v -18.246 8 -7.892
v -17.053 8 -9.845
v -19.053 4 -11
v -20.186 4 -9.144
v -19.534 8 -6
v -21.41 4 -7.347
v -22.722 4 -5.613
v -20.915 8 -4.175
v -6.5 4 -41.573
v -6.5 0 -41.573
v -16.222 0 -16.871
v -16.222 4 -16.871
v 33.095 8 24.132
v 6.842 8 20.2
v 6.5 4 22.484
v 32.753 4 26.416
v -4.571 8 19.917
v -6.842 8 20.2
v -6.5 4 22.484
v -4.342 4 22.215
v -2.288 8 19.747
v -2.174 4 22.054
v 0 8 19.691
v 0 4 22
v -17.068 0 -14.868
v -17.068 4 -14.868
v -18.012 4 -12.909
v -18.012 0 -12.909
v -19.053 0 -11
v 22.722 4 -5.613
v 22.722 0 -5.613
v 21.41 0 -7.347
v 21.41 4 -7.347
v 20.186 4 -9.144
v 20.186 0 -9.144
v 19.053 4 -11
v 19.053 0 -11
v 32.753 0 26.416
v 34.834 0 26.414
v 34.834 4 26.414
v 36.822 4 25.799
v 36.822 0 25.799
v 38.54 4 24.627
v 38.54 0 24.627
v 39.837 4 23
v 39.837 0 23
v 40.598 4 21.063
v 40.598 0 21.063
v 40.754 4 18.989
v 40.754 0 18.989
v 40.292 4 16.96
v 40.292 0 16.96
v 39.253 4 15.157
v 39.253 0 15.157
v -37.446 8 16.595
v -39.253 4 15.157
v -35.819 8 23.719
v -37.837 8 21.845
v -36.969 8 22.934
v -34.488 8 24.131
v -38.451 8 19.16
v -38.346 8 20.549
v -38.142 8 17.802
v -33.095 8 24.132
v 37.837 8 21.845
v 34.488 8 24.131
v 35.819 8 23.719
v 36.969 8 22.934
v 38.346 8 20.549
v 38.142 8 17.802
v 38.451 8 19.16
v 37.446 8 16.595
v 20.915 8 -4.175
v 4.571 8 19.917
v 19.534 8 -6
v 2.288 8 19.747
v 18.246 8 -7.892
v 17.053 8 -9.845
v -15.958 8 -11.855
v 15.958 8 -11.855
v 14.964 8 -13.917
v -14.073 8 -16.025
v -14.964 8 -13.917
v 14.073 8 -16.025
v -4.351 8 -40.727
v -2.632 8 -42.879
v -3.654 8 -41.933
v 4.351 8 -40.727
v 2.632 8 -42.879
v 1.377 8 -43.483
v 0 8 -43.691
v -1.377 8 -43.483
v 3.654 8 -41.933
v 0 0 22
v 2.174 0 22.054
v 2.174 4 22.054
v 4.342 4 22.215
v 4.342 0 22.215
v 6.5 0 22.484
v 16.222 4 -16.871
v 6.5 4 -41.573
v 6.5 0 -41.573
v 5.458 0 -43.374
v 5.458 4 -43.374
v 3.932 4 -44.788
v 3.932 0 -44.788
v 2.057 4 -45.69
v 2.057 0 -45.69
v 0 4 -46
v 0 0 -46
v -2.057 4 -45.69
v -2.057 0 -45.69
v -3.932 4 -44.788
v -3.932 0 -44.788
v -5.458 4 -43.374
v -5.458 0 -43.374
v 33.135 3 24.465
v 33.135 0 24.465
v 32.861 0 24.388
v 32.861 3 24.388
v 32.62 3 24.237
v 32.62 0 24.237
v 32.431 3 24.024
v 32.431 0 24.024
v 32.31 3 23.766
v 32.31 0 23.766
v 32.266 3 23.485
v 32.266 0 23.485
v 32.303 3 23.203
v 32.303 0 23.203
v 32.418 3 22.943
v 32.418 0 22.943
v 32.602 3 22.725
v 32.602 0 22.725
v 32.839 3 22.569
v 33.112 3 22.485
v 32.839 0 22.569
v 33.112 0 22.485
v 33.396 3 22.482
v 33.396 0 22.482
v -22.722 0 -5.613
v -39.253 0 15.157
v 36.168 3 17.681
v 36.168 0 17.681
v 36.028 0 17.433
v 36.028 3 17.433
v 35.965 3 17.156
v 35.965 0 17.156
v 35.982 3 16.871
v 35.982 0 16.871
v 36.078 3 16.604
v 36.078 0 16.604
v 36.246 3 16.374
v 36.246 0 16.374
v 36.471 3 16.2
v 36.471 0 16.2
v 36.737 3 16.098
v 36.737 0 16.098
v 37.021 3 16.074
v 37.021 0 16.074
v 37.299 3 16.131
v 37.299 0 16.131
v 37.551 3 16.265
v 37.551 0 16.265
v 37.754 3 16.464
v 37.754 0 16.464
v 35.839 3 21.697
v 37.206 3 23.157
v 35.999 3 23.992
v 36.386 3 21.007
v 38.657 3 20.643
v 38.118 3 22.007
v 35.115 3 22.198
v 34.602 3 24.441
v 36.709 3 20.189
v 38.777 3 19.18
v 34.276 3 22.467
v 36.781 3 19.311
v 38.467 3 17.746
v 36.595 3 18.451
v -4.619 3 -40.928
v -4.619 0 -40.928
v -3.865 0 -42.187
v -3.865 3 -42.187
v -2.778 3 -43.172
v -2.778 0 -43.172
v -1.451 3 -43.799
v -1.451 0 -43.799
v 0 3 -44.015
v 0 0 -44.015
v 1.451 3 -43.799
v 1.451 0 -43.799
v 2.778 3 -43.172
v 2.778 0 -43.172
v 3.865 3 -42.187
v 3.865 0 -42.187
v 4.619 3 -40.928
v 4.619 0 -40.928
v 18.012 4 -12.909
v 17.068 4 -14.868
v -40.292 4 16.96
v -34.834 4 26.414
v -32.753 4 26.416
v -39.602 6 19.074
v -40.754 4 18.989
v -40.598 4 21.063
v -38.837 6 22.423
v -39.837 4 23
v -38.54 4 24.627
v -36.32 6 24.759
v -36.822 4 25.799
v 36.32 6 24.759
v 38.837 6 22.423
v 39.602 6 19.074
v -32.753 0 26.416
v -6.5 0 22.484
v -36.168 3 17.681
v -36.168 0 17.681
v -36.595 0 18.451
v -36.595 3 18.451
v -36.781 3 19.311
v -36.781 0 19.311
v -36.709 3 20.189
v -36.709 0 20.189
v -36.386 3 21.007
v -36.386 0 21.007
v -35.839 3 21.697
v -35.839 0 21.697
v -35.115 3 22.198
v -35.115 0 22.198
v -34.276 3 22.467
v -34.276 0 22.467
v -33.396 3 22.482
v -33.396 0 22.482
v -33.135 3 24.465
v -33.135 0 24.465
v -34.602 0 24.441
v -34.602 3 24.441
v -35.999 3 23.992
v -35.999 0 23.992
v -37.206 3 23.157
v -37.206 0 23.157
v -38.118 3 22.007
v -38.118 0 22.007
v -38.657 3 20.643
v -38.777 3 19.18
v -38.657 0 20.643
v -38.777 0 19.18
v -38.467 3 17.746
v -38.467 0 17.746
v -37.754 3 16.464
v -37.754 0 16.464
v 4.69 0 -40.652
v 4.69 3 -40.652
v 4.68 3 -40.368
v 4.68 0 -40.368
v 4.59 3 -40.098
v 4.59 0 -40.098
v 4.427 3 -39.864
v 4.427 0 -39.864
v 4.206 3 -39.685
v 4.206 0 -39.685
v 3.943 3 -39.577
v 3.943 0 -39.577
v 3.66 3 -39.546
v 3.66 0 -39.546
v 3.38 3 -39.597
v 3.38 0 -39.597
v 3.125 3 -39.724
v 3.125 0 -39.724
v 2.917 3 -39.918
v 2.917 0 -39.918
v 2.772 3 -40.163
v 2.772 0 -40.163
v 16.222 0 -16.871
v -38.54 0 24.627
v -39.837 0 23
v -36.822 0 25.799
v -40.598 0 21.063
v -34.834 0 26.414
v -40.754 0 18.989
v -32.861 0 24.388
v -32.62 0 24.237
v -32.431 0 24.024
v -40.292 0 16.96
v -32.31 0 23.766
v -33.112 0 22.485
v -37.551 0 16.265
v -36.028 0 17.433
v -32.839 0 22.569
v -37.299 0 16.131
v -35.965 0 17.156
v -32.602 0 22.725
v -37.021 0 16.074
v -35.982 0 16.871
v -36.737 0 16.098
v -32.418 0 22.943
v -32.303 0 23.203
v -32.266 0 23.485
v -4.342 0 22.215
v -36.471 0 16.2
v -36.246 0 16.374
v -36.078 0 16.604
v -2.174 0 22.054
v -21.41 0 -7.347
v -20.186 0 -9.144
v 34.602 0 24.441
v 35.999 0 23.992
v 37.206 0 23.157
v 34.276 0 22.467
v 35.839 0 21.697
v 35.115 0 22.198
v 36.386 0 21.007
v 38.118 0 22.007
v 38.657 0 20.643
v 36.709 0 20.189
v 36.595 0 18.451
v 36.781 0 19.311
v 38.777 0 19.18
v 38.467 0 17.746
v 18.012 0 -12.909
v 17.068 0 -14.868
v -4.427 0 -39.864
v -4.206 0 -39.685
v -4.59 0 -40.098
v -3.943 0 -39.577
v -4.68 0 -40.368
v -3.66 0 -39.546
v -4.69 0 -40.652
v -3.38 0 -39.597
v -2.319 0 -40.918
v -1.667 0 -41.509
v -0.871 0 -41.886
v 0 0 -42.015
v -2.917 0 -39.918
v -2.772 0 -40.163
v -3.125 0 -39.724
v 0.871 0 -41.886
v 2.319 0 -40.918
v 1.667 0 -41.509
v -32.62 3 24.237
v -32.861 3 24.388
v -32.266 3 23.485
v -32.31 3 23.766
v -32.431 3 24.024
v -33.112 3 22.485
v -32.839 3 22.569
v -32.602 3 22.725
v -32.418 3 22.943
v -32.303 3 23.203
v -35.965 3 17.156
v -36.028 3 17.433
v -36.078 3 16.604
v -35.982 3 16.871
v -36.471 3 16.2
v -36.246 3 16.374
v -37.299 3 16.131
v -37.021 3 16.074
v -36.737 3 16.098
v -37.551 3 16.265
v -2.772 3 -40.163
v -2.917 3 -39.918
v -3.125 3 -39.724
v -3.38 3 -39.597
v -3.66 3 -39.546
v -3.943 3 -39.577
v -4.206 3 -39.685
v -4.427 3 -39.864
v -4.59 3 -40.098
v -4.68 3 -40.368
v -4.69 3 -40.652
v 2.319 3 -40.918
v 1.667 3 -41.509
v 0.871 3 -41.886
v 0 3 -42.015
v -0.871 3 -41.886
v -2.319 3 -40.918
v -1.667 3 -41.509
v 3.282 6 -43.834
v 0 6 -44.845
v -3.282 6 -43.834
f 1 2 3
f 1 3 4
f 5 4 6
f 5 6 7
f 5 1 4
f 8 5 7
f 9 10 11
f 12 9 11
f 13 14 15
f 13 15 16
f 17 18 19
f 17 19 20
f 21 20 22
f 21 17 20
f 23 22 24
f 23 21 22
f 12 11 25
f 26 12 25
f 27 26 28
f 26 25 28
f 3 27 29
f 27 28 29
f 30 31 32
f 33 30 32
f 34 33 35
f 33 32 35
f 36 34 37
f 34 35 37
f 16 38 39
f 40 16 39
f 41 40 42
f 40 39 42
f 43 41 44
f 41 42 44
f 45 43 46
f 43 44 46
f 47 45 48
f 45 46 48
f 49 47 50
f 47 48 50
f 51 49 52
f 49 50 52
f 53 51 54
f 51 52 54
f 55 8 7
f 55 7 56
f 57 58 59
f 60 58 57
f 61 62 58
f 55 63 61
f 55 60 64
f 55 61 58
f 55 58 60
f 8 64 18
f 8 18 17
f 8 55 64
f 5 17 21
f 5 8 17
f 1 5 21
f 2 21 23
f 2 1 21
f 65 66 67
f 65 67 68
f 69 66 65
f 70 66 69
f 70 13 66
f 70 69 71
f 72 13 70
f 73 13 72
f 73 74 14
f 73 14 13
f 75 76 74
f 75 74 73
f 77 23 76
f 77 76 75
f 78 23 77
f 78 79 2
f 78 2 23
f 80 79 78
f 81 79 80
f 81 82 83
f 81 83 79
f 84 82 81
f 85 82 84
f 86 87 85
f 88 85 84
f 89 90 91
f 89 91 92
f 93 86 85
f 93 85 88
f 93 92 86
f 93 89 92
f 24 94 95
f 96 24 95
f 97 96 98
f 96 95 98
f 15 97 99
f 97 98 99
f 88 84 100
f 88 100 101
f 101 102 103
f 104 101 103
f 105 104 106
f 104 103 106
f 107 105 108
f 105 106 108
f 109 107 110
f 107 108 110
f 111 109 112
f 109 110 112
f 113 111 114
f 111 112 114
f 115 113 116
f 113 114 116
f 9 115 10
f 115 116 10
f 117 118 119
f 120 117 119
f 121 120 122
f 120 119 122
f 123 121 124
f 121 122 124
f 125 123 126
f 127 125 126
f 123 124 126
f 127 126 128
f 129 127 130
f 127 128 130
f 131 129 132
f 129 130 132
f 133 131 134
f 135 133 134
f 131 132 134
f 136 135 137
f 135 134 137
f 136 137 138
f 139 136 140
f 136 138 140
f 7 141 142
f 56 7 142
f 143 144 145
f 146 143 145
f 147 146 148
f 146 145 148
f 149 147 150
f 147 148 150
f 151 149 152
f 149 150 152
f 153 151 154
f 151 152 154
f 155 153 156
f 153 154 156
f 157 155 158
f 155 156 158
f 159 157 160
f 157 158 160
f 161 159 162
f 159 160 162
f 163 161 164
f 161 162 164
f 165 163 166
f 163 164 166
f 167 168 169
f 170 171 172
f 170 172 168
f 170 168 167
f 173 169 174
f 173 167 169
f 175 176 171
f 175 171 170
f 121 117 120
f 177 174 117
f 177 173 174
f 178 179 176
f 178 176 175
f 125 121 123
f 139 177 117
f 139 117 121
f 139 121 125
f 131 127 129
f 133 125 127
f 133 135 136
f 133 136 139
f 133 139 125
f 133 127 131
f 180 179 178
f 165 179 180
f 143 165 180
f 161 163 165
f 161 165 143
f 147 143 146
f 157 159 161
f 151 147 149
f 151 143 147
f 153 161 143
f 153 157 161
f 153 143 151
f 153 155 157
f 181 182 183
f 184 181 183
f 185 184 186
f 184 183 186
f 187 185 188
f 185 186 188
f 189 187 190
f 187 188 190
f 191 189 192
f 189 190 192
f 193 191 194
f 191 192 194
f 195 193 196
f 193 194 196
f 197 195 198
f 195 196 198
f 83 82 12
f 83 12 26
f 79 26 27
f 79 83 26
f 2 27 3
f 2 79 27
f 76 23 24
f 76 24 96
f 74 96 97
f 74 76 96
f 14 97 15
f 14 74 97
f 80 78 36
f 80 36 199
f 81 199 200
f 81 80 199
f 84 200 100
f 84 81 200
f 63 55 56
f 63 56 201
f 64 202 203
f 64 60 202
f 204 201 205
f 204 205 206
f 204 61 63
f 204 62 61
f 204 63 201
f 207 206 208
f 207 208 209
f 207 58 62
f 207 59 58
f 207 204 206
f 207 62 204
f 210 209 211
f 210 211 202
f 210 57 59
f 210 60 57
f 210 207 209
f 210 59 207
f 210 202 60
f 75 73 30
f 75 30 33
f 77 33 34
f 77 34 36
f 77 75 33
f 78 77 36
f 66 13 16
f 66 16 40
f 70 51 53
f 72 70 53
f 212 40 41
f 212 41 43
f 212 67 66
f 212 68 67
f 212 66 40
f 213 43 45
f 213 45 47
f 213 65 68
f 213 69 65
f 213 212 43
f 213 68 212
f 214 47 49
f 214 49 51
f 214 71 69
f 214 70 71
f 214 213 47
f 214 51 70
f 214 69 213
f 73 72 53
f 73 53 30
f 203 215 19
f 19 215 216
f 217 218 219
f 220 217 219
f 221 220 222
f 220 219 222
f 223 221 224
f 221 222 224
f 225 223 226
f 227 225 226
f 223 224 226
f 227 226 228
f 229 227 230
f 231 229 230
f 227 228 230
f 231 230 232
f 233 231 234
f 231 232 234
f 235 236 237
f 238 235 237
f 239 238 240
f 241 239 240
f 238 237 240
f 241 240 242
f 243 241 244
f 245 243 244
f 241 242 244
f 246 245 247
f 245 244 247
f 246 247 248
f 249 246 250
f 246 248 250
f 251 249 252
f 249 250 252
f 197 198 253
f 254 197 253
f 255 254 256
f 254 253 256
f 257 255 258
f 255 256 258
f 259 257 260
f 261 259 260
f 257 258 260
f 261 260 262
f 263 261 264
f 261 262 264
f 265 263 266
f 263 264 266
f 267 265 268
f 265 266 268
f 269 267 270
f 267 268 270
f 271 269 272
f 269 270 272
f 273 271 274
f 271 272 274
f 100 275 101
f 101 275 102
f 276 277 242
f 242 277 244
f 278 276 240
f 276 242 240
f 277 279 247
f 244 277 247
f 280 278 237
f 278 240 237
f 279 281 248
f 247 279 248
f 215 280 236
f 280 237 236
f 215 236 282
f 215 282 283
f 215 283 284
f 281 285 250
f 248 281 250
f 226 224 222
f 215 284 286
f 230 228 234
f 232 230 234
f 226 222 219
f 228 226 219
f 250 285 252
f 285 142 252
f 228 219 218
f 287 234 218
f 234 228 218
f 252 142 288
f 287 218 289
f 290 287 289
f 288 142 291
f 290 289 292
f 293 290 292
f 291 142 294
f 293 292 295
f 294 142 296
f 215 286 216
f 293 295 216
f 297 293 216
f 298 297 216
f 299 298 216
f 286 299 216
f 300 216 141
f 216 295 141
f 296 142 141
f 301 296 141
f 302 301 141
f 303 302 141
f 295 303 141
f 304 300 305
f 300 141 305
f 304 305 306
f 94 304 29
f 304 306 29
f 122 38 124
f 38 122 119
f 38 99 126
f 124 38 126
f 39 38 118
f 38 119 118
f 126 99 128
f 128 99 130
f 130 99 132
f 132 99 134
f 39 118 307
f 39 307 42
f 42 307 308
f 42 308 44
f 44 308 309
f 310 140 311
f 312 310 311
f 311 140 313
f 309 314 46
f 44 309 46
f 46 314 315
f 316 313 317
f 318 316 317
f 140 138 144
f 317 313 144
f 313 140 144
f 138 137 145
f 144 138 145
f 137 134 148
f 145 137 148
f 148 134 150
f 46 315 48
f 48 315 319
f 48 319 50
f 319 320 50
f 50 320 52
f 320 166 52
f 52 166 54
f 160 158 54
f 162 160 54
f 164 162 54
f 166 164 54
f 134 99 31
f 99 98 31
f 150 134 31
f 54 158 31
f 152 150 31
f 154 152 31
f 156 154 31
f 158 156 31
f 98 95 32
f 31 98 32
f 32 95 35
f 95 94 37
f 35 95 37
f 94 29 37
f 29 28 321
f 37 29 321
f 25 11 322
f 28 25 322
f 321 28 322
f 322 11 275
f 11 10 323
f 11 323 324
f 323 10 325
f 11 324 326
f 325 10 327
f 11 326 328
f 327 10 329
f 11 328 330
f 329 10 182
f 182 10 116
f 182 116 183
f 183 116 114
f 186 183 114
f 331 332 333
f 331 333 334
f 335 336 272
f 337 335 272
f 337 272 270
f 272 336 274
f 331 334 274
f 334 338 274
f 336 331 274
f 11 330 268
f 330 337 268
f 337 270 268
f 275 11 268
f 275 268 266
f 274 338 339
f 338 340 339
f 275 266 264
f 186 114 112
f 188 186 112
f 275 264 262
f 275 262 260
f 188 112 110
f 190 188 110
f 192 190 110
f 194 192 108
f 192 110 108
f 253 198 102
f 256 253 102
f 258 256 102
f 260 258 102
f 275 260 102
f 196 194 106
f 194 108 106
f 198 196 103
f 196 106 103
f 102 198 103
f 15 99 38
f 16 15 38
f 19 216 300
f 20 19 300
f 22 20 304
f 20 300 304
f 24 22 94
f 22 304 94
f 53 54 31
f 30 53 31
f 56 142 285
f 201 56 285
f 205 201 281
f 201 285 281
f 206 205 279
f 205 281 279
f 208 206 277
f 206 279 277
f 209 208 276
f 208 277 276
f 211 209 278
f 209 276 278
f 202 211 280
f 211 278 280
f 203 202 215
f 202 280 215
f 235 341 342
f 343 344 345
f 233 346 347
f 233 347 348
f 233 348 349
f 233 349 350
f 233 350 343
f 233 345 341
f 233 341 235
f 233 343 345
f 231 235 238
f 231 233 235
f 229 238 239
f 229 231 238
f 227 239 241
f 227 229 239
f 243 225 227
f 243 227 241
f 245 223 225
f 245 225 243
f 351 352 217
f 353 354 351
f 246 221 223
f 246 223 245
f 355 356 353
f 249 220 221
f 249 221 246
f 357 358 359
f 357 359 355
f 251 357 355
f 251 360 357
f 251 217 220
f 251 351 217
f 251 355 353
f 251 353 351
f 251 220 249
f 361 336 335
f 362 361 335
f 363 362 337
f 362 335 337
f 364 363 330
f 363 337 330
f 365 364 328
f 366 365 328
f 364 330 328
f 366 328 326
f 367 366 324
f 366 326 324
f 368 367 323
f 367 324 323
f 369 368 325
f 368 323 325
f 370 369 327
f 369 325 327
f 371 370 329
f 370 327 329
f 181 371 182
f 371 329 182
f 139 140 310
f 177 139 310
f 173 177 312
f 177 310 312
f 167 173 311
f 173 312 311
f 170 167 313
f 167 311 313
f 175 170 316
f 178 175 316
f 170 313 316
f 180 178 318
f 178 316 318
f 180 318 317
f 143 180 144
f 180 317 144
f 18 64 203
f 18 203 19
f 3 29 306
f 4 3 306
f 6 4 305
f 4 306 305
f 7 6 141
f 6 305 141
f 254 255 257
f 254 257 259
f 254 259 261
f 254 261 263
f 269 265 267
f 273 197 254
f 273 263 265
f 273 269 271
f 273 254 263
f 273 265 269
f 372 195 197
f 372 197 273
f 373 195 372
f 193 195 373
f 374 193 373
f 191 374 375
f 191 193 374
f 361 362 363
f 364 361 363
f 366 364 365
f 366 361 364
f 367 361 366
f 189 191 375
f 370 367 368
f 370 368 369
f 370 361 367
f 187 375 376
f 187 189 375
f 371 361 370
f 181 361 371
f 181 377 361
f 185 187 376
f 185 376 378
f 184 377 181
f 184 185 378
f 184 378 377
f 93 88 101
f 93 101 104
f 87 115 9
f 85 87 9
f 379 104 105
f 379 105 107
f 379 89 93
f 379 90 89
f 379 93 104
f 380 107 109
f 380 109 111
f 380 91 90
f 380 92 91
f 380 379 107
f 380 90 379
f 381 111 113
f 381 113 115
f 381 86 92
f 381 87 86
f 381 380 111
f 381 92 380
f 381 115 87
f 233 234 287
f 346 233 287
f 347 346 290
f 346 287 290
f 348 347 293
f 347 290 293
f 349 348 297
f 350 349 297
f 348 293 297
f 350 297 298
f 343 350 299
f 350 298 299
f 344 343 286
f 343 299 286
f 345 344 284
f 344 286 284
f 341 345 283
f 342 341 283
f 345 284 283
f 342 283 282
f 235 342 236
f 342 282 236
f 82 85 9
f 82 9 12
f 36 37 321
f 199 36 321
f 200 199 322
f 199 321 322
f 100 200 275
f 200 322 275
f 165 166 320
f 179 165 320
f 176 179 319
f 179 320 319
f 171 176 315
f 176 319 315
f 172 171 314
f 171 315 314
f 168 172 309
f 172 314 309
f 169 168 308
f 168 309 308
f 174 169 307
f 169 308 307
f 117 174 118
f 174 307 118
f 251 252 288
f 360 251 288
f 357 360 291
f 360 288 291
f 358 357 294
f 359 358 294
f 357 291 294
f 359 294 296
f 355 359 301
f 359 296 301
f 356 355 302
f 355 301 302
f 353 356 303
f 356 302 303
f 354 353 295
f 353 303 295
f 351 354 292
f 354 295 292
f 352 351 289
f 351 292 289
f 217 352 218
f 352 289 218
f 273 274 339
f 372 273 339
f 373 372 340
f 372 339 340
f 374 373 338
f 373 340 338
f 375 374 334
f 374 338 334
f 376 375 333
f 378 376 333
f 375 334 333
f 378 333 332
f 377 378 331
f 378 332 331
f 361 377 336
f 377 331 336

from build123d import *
from OCP.BRepFilletAPI import BRepFilletAPI_MakeChamfer

# Parameters (mm, degrees)
EXTRUDE2_DEPTH     = 8
CHAMFER2_SIZE      = 4
CHAMFER2_SIZE2     = 2.309401077
CUT_EXTRUDE1_DEPTH = 3


with BuildPart() as part:
    # Sketch1 → Extrude2 (new body)
    with BuildSketch(Plane(origin=(0, 0, 0), x_dir=(1, 0, 0), z_dir=(0, 1, 0))):
        with BuildLine():
            Line((-6.5, 41.572883869), (-16.221725084, 16.871170844))
            ThreePointArc((-16.221725084, 16.871170844), (-17.527996386, 13.882959965), (-19.052558883, 11))
            ThreePointArc((-19.052558883, 11), (-20.786994202, 8.238210165), (-22.721725084, 5.612840594))
            Line((-22.721725084, 5.612840594), (-39.253173539, -15.15727681))
            ThreePointArc((-39.253173539, -15.15727681), (-39.837168574, -23), (-32.753173539, -26.415607059))
            Line((-32.753173539, -26.415607059), (-6.5, -22.484011438))
            ThreePointArc((-6.5, -22.484011438), (-3.258997817, -22.12117013), (0, -22))
            ThreePointArc((0, -22), (3.258997817, -22.12117013), (6.5, -22.484011438))
            Line((6.5, -22.484011438), (32.753173539, -26.415607059))
            ThreePointArc((32.753173539, -26.415607059), (39.837168574, -23), (39.253173539, -15.15727681))
            Line((39.253173539, -15.15727681), (22.721725084, 5.612840594))
            ThreePointArc((22.721725084, 5.612840594), (20.786994202, 8.238210165), (19.052558883, 11))
            ThreePointArc((19.052558883, 11), (17.527996386, 13.882959965), (16.221725084, 16.871170844))
            Line((16.221725084, 16.871170844), (6.5, 41.572883869))
            ThreePointArc((6.5, 41.572883869), (0, 46), (-6.5, 41.572883869))
        make_face()
    extrude(amount=EXTRUDE2_DEPTH)

    # Chamfer2: one chamfer whose edges measure the first distance from different faces: ONE call of the kernel's chamfer builder (chamfer() names one face for all edges)
    chamfer2_edges_1 = [part.edges().sort_by_distance(p)[0] for p in [
        (-19.052558883, 8, -11),
    ]]
    chamfer2_side_1 = [part.faces().sort_by_distance(p)[0] for p in [
        (-19.052558883, 4, -11),
    ]]
    chamfer2_edges_2 = [part.edges().sort_by_distance(p)[0] for p in [
        (-30.987449312, 8, 4.772218108),
    ]]
    chamfer2_side_2 = [part.faces().sort_by_distance(p)[0] for p in [
        (-30.987449312, 4, 4.772218108),
    ]]
    chamfer2_edges_3 = [part.edges().sort_by_distance(p)[0] for p in [
        (-39.837168574, 8, 23),
    ]]
    chamfer2_side_3 = [part.faces().sort_by_distance(p)[0] for p in [
        (-39.837168574, 4, 23),
    ]]
    chamfer2_edges_4 = [part.edges().sort_by_distance(p)[0] for p in [
        (-19.626586769, 8, 24.449809248),
    ]]
    chamfer2_side_4 = [part.faces().sort_by_distance(p)[0] for p in [
        (-19.626586769, 4, 24.449809248),
    ]]
    chamfer2_edges_5 = [part.edges().sort_by_distance(p)[0] for p in [
        (0, 8, 22),
    ]]
    chamfer2_side_5 = [part.faces().sort_by_distance(p)[0] for p in [
        (0, 4, 22),
    ]]
    chamfer2_edges_6 = [part.edges().sort_by_distance(p)[0] for p in [
        (19.626586769, 8, 24.449809248),
    ]]
    chamfer2_side_6 = [part.faces().sort_by_distance(p)[0] for p in [
        (19.626586769, 4, 24.449809248),
    ]]
    chamfer2_edges_7 = [part.edges().sort_by_distance(p)[0] for p in [
        (39.837168574, 8, 23),
    ]]
    chamfer2_side_7 = [part.faces().sort_by_distance(p)[0] for p in [
        (39.837168574, 4, 23),
    ]]
    chamfer2_edges_8 = [part.edges().sort_by_distance(p)[0] for p in [
        (30.987449312, 8, 4.772218108),
    ]]
    chamfer2_side_8 = [part.faces().sort_by_distance(p)[0] for p in [
        (30.987449312, 4, 4.772218108),
    ]]
    chamfer2_edges_9 = [part.edges().sort_by_distance(p)[0] for p in [
        (0, 8, -46),
    ]]
    chamfer2_side_9 = [part.faces().sort_by_distance(p)[0] for p in [
        (0, 4, -46),
    ]]
    chamfer2_edges_10 = [part.edges().sort_by_distance(p)[0] for p in [
        (19.052558883, 8, -11),
    ]]
    chamfer2_side_10 = [part.faces().sort_by_distance(p)[0] for p in [
        (19.052558883, 4, -11),
    ]]
    chamfer2_edges_11 = [part.edges().sort_by_distance(p)[0] for p in [
        (11.360862542, 8, -29.222027356),
    ]]
    chamfer2_side_11 = [part.faces().sort_by_distance(p)[0] for p in [
        (11.360862542, 4, -29.222027356),
    ]]
    chamfer2_edges_12 = [part.edges().sort_by_distance(p)[0] for p in [
        (-11.360862542, 8, -29.222027356),
    ]]
    chamfer2_side_12 = [part.faces().sort_by_distance(p)[0] for p in [
        (-11.360862542, 4, -29.222027356),
    ]]
    chamfer2 = BRepFilletAPI_MakeChamfer(part.part.solid().wrapped)
    for e in chamfer2_edges_1:
        chamfer2.Add(CHAMFER2_SIZE, CHAMFER2_SIZE2, e.wrapped, chamfer2_side_1[0].wrapped)  # the first distance lies on this face
    for e in chamfer2_edges_2:
        chamfer2.Add(CHAMFER2_SIZE, CHAMFER2_SIZE2, e.wrapped, chamfer2_side_2[0].wrapped)  # the first distance lies on this face
    for e in chamfer2_edges_3:
        chamfer2.Add(CHAMFER2_SIZE, CHAMFER2_SIZE2, e.wrapped, chamfer2_side_3[0].wrapped)  # the first distance lies on this face
    for e in chamfer2_edges_4:
        chamfer2.Add(CHAMFER2_SIZE, CHAMFER2_SIZE2, e.wrapped, chamfer2_side_4[0].wrapped)  # the first distance lies on this face
    for e in chamfer2_edges_5:
        chamfer2.Add(CHAMFER2_SIZE, CHAMFER2_SIZE2, e.wrapped, chamfer2_side_5[0].wrapped)  # the first distance lies on this face
    for e in chamfer2_edges_6:
        chamfer2.Add(CHAMFER2_SIZE, CHAMFER2_SIZE2, e.wrapped, chamfer2_side_6[0].wrapped)  # the first distance lies on this face
    for e in chamfer2_edges_7:
        chamfer2.Add(CHAMFER2_SIZE, CHAMFER2_SIZE2, e.wrapped, chamfer2_side_7[0].wrapped)  # the first distance lies on this face
    for e in chamfer2_edges_8:
        chamfer2.Add(CHAMFER2_SIZE, CHAMFER2_SIZE2, e.wrapped, chamfer2_side_8[0].wrapped)  # the first distance lies on this face
    for e in chamfer2_edges_9:
        chamfer2.Add(CHAMFER2_SIZE, CHAMFER2_SIZE2, e.wrapped, chamfer2_side_9[0].wrapped)  # the first distance lies on this face
    for e in chamfer2_edges_10:
        chamfer2.Add(CHAMFER2_SIZE, CHAMFER2_SIZE2, e.wrapped, chamfer2_side_10[0].wrapped)  # the first distance lies on this face
    for e in chamfer2_edges_11:
        chamfer2.Add(CHAMFER2_SIZE, CHAMFER2_SIZE2, e.wrapped, chamfer2_side_11[0].wrapped)  # the first distance lies on this face
    for e in chamfer2_edges_12:
        chamfer2.Add(CHAMFER2_SIZE, CHAMFER2_SIZE2, e.wrapped, chamfer2_side_12[0].wrapped)  # the first distance lies on this face
    add(Compound.cast(chamfer2.Shape()), mode=Mode.REPLACE)

    # Sketch2 → Cut-Extrude1 (cut)
    with BuildSketch(Plane(origin=(0, 0, 0), x_dir=(1, 0, 0), z_dir=(0, 1, 0))):
        with BuildLine():
            ThreePointArc((-33.135101254, -24.464580596), (-38.117859233, -22.00735629), (-37.754498914, -16.463549149))
            ThreePointArc((-37.754498914, -16.463549149), (-36.352384156, -16.278957239), (-36.167792243, -17.681071999))
            ThreePointArc((-36.167792243, -17.681071999), (-36.385808436, -21.007356296), (-33.396153637, -22.481690885))
            ThreePointArc((-33.396153637, -22.481690885), (-32.274182592, -23.342609551), (-33.135101254, -24.464580596))
        make_face()
        with BuildLine():
            ThreePointArc((-4.619397662, 40.928129741), (-1e-09, 44.014712579), (4.619397658, 40.928129741))
            ThreePointArc((4.619397658, 40.928129741), (4.078201562, 39.621566787), (2.771638604, 40.162762881))
            ThreePointArc((2.771638604, 40.162762881), (-1e-09, 42.014712591), (-2.771638608, 40.162762881))
            ThreePointArc((-2.771638608, 40.162762881), (-4.078201566, 39.621566787), (-4.619397662, 40.928129741))
        make_face()
        with BuildLine():
            ThreePointArc((37.754498916, -16.463549145), (38.117859234, -22.007356289), (33.135101256, -24.464580593))
            ThreePointArc((33.135101256, -24.464580593), (32.274182594, -23.342609548), (33.396153639, -22.481690882))
            ThreePointArc((33.396153639, -22.481690882), (36.385808436, -21.007356295), (36.167792245, -17.681071996))
            ThreePointArc((36.167792245, -17.681071996), (36.352384158, -16.278957236), (37.754498916, -16.463549145))
        make_face()
    extrude(amount=CUT_EXTRUDE1_DEPTH, mode=Mode.SUBTRACT)


solid = part.part
